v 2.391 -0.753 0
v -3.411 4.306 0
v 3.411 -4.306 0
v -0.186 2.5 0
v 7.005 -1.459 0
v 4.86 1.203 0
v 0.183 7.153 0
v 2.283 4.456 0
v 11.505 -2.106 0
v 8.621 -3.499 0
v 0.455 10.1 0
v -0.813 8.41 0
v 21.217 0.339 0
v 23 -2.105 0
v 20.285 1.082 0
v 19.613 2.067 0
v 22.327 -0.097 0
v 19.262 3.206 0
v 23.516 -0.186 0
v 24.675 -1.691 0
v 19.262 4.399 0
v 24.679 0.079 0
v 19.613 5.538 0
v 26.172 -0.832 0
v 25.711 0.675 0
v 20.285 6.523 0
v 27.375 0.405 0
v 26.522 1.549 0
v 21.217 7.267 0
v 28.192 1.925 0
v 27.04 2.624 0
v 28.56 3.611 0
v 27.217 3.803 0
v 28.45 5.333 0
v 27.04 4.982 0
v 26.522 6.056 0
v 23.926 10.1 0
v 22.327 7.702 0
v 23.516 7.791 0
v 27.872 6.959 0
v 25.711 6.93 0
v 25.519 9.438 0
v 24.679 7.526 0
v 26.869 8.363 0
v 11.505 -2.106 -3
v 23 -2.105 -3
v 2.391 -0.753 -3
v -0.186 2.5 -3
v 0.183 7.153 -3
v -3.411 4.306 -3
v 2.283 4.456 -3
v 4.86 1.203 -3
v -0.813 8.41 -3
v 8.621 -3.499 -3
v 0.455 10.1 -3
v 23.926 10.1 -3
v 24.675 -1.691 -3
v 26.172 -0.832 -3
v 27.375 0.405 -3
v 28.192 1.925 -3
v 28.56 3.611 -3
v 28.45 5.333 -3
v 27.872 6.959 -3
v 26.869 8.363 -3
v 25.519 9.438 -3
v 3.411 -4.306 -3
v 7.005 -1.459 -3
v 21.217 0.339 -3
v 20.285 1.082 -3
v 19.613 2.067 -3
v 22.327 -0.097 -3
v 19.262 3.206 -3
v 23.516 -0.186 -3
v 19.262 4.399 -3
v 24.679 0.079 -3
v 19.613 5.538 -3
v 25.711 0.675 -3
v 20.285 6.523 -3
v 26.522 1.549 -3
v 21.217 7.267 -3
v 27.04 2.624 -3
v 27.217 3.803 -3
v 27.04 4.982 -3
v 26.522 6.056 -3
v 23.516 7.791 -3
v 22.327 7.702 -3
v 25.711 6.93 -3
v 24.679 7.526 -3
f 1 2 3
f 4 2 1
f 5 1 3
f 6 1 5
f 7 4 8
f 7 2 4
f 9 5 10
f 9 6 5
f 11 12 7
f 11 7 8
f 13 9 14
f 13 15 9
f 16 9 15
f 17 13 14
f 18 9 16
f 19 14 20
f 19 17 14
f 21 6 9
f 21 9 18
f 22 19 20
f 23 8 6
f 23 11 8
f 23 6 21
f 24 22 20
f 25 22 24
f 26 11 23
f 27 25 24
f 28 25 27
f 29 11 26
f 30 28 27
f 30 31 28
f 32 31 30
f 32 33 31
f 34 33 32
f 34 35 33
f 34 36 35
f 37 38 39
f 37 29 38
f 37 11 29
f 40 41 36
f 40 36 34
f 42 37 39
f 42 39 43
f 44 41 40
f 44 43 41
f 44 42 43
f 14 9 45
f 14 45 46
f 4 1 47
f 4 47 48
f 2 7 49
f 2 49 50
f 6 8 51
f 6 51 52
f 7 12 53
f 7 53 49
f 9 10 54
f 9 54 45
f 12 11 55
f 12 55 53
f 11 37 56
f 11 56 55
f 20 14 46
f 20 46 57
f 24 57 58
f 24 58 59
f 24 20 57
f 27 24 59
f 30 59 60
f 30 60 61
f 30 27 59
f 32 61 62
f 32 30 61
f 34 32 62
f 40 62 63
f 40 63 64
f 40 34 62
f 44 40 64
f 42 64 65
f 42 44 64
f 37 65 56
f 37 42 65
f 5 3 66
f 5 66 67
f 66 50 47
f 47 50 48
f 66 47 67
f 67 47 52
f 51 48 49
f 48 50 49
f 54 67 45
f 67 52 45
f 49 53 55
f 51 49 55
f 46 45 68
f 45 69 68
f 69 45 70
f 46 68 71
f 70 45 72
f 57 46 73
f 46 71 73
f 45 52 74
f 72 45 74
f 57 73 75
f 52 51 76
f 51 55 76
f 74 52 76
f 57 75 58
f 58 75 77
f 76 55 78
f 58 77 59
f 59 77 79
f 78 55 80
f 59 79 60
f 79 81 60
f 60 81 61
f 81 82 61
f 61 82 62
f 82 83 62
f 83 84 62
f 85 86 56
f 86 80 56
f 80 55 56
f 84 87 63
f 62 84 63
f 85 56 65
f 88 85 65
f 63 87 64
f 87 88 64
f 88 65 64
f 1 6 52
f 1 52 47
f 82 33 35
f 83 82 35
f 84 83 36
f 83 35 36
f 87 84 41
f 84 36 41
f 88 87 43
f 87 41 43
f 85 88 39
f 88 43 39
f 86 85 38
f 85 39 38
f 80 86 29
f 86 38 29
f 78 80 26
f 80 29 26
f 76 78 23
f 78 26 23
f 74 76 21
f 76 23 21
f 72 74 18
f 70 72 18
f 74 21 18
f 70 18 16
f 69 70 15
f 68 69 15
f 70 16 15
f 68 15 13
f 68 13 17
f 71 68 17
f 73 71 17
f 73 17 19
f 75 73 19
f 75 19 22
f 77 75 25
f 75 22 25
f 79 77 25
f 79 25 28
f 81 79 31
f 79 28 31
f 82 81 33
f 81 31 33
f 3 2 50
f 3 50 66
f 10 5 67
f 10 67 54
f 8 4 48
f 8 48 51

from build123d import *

# Parameters (mm, degrees)
SKETCH1_R           = 4
BOSS_EXTRUDE1_DEPTH = 3


with BuildPart() as part:
    # Sketch1 → Boss-Extrude1 (new body)
    with BuildSketch(Plane.XY):
        with BuildLine():
            Line((-3.41129842, 4.305994118), (3.41129842, -4.305994118))
            Line((3.41129842, -4.305994118), (7.005179011, -1.458846897))
            Line((7.005179011, -1.458846897), (8.621253306, -3.498775848))
            Line((8.621253306, -3.498775848), (11.505363509, -2.105535978))
            Line((11.505363509, -2.105535978), (23.000363507, -2.105335353))
            ThreePointArc((23.000363507, -2.105335353), (28.559669511, 3.611172521), (23.925659877, 10.100417487))
            Line((23.925659877, 10.100417487), (0.454659877, 10.100417487))
            Line((0.454659877, 10.100417487), (-0.813143143, 8.410019752))
            Line((-0.813143143, 8.410019752), (0.182582172, 7.153141338))
            Line((0.182582172, 7.153141338), (-3.41129842, 4.305994118))
        make_face()
        with Locations((23.217363507, 3.802664647)):
            Circle(SKETCH1_R, mode=Mode.SUBTRACT)
        Polygon((2.283340507, 4.456152944), (4.860365799, 1.203240304), (2.39128753, -0.752815038), (-0.185737762, 2.500097602), align=None, mode=Mode.SUBTRACT)
    extrude(amount=-BOSS_EXTRUDE1_DEPTH)


solid = part.part
